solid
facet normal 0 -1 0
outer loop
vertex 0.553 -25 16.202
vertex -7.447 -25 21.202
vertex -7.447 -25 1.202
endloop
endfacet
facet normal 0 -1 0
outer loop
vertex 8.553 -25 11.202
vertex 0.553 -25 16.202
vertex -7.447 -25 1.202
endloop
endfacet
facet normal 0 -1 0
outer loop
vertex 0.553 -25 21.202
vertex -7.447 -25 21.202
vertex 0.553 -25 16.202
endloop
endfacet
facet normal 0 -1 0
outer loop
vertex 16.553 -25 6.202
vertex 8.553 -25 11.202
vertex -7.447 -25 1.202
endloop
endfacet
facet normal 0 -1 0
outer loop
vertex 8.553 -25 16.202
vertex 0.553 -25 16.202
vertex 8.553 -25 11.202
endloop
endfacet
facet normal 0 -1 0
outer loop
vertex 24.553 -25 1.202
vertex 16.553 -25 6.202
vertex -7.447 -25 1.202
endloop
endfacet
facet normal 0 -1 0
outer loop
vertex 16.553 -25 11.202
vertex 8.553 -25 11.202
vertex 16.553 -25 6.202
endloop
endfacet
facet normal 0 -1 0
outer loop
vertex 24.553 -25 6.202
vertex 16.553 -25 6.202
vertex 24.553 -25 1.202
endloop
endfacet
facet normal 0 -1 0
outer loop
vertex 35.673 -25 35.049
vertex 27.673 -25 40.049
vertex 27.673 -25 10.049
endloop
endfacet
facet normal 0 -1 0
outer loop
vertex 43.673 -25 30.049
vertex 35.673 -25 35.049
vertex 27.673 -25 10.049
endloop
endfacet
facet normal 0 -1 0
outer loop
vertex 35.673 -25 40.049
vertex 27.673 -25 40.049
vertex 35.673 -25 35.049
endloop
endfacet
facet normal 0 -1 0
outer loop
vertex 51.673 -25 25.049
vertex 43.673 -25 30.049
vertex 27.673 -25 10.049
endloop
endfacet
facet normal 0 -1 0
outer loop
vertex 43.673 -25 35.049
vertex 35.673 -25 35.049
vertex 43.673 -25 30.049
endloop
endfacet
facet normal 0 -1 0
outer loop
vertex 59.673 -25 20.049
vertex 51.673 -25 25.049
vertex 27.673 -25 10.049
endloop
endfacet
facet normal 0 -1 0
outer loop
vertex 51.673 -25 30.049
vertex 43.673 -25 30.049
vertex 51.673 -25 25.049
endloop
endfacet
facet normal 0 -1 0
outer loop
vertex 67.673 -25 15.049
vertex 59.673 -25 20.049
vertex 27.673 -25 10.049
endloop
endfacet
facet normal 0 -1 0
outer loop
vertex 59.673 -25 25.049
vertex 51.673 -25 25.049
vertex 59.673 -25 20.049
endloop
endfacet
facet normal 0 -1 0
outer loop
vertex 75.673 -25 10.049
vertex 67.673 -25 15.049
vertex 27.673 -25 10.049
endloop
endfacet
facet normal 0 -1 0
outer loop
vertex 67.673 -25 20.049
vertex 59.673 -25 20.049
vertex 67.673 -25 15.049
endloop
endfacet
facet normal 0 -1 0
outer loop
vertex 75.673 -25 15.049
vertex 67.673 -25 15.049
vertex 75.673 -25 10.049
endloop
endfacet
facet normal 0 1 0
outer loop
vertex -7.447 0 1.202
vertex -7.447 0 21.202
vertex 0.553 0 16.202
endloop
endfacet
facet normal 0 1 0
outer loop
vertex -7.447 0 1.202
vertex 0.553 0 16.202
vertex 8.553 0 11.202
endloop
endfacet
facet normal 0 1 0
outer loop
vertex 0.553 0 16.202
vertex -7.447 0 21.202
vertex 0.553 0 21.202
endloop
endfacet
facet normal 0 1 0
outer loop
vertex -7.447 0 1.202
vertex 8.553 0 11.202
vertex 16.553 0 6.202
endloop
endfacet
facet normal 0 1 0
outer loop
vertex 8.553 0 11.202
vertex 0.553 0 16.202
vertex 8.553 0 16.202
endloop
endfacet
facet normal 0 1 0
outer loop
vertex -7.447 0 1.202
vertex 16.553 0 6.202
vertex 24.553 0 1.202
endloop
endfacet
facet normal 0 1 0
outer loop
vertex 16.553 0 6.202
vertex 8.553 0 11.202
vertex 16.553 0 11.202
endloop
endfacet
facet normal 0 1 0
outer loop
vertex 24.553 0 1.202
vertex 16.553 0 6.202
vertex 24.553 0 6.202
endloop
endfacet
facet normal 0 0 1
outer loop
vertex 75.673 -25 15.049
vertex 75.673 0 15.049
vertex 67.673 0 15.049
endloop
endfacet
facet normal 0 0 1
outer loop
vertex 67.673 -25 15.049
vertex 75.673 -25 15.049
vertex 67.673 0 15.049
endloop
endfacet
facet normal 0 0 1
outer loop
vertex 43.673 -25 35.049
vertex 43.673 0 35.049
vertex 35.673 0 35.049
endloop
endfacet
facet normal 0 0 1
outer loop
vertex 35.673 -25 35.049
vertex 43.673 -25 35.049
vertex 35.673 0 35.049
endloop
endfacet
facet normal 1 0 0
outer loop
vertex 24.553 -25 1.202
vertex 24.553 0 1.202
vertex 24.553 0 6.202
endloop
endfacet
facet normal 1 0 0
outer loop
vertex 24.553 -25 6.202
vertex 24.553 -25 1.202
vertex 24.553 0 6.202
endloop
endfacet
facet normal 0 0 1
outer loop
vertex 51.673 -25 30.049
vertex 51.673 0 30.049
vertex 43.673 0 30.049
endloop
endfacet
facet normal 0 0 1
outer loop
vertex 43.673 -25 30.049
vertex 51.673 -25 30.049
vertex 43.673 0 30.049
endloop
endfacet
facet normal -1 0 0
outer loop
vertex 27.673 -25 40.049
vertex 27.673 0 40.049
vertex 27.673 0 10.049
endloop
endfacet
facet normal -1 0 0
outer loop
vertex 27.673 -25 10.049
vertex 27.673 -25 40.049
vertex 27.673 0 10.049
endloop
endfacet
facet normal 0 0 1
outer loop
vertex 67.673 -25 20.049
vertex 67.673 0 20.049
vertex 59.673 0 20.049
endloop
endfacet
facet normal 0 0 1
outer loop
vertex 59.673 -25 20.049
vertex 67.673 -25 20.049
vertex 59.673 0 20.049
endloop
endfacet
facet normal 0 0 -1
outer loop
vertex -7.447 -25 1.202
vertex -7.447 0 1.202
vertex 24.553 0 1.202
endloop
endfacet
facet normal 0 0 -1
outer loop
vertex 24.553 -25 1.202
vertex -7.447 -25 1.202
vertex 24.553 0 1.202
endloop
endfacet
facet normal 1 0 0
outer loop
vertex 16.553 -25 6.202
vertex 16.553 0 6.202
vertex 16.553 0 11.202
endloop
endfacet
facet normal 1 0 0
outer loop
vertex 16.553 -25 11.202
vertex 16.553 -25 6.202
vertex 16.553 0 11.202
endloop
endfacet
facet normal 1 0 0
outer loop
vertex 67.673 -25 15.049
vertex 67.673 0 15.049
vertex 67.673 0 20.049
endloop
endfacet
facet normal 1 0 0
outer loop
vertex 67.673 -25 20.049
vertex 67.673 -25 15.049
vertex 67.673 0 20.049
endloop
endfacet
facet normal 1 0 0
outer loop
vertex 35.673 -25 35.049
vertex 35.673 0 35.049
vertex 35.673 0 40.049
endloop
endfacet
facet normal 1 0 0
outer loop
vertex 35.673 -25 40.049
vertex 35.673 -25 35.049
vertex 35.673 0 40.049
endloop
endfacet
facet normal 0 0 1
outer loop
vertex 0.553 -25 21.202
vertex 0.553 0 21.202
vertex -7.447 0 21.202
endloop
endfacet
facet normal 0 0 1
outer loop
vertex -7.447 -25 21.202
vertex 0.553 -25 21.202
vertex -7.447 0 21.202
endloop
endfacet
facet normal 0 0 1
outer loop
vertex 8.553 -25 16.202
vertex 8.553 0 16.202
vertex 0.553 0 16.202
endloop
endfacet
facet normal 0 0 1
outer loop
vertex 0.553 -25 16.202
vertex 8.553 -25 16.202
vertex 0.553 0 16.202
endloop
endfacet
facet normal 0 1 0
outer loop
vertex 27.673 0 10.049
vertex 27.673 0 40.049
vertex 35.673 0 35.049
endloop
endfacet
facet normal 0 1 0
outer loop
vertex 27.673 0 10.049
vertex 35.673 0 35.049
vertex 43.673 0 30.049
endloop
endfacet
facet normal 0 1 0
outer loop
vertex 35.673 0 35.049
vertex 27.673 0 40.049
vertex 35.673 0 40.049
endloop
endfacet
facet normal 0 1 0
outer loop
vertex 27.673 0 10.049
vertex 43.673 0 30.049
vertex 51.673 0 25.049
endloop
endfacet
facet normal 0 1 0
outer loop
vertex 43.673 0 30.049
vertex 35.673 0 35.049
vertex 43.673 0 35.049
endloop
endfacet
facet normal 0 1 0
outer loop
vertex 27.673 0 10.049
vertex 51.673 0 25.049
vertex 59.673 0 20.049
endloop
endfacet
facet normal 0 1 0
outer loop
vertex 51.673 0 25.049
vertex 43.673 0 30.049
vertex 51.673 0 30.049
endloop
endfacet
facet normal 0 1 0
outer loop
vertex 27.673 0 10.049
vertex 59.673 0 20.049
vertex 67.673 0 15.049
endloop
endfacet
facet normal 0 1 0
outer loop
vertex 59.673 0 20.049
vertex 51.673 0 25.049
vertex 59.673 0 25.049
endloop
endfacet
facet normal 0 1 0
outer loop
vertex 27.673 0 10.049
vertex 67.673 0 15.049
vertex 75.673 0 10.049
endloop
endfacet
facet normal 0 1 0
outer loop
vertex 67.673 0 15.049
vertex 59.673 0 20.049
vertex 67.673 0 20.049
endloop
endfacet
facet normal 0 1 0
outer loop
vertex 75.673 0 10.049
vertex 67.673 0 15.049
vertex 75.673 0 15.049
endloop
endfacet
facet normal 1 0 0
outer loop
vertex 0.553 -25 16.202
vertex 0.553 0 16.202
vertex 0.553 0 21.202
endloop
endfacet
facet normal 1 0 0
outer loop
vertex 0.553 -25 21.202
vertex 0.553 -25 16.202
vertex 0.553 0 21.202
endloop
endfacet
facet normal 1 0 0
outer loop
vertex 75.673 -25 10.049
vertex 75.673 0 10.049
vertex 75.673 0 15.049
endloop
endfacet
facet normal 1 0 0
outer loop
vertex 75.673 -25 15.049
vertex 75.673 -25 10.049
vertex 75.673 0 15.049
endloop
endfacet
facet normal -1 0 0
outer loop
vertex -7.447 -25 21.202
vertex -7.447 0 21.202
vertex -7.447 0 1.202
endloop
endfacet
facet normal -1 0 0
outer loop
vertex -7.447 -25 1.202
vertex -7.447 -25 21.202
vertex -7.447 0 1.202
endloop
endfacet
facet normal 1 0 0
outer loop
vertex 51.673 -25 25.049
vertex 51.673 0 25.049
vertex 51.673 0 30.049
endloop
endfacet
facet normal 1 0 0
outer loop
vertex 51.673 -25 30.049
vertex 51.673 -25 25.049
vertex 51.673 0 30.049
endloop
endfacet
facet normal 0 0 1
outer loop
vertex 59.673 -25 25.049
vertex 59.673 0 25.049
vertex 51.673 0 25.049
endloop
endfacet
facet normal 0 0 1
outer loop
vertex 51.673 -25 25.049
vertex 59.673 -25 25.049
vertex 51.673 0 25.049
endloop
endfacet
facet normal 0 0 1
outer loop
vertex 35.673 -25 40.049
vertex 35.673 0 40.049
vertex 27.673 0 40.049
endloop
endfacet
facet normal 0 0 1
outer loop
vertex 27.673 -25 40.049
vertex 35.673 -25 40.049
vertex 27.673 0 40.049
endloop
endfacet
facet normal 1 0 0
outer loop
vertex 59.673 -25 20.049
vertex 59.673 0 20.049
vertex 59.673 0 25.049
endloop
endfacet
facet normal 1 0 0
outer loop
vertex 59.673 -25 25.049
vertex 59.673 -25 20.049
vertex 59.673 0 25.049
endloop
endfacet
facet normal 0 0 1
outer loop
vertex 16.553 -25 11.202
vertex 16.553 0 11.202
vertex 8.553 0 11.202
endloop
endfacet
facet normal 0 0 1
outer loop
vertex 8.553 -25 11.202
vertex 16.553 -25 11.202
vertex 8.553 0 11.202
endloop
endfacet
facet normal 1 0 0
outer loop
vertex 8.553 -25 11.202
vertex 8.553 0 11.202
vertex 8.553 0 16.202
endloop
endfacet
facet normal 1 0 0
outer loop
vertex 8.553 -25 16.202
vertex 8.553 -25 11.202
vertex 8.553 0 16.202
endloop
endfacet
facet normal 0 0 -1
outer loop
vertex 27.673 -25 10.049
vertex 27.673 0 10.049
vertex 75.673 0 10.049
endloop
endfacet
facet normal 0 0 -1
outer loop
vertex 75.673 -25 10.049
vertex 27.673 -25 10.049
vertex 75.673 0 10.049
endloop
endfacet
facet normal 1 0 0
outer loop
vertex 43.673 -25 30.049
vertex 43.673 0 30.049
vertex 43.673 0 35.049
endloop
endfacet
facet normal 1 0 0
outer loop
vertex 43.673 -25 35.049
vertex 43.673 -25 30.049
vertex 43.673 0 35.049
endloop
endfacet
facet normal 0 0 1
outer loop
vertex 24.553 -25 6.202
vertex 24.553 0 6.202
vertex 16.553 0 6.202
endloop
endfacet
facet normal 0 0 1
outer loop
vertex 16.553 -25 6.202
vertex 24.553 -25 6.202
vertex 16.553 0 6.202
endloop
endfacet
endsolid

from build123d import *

# Parameters (mm, degrees)
F1_DEPTH = 25
F3_DEPTH = 25


with BuildPart() as f1:
    # F0 (on Front) → F1 (new body)
    with BuildSketch(Plane.XZ):
        Polygon((-7.447419, 21.20217), (-7.447419, 1.20217), (24.552581, 1.20217), (24.552581, 6.20217), (16.552581, 6.20217), (16.552581, 11.20217), (8.552581, 11.20217), (8.552581, 16.20217), (0.552581, 16.20217), (0.552581, 21.20217), align=None)
    extrude(amount=F1_DEPTH)


with BuildPart() as f3:
    # F2 (on Front) → F3 (new body)
    with BuildSketch(Plane.XZ):
        Polygon((27.673446, 40.048658), (27.673446, 10.048658), (28.946173, 10.048658), (75.673446, 10.048658), (75.673446, 15.048658), (67.673446, 15.048658), (67.673446, 20.048658), (59.673446, 20.048658), (59.673446, 25.048658), (51.673446, 25.048658), (51.673446, 30.048658), (43.673446, 30.048658), (43.673446, 35.048658), (35.673446, 35.048658), (35.673446, 40.048658), align=None)
    extrude(amount=F3_DEPTH)


solid = Compound([f1.part, f3.part])
